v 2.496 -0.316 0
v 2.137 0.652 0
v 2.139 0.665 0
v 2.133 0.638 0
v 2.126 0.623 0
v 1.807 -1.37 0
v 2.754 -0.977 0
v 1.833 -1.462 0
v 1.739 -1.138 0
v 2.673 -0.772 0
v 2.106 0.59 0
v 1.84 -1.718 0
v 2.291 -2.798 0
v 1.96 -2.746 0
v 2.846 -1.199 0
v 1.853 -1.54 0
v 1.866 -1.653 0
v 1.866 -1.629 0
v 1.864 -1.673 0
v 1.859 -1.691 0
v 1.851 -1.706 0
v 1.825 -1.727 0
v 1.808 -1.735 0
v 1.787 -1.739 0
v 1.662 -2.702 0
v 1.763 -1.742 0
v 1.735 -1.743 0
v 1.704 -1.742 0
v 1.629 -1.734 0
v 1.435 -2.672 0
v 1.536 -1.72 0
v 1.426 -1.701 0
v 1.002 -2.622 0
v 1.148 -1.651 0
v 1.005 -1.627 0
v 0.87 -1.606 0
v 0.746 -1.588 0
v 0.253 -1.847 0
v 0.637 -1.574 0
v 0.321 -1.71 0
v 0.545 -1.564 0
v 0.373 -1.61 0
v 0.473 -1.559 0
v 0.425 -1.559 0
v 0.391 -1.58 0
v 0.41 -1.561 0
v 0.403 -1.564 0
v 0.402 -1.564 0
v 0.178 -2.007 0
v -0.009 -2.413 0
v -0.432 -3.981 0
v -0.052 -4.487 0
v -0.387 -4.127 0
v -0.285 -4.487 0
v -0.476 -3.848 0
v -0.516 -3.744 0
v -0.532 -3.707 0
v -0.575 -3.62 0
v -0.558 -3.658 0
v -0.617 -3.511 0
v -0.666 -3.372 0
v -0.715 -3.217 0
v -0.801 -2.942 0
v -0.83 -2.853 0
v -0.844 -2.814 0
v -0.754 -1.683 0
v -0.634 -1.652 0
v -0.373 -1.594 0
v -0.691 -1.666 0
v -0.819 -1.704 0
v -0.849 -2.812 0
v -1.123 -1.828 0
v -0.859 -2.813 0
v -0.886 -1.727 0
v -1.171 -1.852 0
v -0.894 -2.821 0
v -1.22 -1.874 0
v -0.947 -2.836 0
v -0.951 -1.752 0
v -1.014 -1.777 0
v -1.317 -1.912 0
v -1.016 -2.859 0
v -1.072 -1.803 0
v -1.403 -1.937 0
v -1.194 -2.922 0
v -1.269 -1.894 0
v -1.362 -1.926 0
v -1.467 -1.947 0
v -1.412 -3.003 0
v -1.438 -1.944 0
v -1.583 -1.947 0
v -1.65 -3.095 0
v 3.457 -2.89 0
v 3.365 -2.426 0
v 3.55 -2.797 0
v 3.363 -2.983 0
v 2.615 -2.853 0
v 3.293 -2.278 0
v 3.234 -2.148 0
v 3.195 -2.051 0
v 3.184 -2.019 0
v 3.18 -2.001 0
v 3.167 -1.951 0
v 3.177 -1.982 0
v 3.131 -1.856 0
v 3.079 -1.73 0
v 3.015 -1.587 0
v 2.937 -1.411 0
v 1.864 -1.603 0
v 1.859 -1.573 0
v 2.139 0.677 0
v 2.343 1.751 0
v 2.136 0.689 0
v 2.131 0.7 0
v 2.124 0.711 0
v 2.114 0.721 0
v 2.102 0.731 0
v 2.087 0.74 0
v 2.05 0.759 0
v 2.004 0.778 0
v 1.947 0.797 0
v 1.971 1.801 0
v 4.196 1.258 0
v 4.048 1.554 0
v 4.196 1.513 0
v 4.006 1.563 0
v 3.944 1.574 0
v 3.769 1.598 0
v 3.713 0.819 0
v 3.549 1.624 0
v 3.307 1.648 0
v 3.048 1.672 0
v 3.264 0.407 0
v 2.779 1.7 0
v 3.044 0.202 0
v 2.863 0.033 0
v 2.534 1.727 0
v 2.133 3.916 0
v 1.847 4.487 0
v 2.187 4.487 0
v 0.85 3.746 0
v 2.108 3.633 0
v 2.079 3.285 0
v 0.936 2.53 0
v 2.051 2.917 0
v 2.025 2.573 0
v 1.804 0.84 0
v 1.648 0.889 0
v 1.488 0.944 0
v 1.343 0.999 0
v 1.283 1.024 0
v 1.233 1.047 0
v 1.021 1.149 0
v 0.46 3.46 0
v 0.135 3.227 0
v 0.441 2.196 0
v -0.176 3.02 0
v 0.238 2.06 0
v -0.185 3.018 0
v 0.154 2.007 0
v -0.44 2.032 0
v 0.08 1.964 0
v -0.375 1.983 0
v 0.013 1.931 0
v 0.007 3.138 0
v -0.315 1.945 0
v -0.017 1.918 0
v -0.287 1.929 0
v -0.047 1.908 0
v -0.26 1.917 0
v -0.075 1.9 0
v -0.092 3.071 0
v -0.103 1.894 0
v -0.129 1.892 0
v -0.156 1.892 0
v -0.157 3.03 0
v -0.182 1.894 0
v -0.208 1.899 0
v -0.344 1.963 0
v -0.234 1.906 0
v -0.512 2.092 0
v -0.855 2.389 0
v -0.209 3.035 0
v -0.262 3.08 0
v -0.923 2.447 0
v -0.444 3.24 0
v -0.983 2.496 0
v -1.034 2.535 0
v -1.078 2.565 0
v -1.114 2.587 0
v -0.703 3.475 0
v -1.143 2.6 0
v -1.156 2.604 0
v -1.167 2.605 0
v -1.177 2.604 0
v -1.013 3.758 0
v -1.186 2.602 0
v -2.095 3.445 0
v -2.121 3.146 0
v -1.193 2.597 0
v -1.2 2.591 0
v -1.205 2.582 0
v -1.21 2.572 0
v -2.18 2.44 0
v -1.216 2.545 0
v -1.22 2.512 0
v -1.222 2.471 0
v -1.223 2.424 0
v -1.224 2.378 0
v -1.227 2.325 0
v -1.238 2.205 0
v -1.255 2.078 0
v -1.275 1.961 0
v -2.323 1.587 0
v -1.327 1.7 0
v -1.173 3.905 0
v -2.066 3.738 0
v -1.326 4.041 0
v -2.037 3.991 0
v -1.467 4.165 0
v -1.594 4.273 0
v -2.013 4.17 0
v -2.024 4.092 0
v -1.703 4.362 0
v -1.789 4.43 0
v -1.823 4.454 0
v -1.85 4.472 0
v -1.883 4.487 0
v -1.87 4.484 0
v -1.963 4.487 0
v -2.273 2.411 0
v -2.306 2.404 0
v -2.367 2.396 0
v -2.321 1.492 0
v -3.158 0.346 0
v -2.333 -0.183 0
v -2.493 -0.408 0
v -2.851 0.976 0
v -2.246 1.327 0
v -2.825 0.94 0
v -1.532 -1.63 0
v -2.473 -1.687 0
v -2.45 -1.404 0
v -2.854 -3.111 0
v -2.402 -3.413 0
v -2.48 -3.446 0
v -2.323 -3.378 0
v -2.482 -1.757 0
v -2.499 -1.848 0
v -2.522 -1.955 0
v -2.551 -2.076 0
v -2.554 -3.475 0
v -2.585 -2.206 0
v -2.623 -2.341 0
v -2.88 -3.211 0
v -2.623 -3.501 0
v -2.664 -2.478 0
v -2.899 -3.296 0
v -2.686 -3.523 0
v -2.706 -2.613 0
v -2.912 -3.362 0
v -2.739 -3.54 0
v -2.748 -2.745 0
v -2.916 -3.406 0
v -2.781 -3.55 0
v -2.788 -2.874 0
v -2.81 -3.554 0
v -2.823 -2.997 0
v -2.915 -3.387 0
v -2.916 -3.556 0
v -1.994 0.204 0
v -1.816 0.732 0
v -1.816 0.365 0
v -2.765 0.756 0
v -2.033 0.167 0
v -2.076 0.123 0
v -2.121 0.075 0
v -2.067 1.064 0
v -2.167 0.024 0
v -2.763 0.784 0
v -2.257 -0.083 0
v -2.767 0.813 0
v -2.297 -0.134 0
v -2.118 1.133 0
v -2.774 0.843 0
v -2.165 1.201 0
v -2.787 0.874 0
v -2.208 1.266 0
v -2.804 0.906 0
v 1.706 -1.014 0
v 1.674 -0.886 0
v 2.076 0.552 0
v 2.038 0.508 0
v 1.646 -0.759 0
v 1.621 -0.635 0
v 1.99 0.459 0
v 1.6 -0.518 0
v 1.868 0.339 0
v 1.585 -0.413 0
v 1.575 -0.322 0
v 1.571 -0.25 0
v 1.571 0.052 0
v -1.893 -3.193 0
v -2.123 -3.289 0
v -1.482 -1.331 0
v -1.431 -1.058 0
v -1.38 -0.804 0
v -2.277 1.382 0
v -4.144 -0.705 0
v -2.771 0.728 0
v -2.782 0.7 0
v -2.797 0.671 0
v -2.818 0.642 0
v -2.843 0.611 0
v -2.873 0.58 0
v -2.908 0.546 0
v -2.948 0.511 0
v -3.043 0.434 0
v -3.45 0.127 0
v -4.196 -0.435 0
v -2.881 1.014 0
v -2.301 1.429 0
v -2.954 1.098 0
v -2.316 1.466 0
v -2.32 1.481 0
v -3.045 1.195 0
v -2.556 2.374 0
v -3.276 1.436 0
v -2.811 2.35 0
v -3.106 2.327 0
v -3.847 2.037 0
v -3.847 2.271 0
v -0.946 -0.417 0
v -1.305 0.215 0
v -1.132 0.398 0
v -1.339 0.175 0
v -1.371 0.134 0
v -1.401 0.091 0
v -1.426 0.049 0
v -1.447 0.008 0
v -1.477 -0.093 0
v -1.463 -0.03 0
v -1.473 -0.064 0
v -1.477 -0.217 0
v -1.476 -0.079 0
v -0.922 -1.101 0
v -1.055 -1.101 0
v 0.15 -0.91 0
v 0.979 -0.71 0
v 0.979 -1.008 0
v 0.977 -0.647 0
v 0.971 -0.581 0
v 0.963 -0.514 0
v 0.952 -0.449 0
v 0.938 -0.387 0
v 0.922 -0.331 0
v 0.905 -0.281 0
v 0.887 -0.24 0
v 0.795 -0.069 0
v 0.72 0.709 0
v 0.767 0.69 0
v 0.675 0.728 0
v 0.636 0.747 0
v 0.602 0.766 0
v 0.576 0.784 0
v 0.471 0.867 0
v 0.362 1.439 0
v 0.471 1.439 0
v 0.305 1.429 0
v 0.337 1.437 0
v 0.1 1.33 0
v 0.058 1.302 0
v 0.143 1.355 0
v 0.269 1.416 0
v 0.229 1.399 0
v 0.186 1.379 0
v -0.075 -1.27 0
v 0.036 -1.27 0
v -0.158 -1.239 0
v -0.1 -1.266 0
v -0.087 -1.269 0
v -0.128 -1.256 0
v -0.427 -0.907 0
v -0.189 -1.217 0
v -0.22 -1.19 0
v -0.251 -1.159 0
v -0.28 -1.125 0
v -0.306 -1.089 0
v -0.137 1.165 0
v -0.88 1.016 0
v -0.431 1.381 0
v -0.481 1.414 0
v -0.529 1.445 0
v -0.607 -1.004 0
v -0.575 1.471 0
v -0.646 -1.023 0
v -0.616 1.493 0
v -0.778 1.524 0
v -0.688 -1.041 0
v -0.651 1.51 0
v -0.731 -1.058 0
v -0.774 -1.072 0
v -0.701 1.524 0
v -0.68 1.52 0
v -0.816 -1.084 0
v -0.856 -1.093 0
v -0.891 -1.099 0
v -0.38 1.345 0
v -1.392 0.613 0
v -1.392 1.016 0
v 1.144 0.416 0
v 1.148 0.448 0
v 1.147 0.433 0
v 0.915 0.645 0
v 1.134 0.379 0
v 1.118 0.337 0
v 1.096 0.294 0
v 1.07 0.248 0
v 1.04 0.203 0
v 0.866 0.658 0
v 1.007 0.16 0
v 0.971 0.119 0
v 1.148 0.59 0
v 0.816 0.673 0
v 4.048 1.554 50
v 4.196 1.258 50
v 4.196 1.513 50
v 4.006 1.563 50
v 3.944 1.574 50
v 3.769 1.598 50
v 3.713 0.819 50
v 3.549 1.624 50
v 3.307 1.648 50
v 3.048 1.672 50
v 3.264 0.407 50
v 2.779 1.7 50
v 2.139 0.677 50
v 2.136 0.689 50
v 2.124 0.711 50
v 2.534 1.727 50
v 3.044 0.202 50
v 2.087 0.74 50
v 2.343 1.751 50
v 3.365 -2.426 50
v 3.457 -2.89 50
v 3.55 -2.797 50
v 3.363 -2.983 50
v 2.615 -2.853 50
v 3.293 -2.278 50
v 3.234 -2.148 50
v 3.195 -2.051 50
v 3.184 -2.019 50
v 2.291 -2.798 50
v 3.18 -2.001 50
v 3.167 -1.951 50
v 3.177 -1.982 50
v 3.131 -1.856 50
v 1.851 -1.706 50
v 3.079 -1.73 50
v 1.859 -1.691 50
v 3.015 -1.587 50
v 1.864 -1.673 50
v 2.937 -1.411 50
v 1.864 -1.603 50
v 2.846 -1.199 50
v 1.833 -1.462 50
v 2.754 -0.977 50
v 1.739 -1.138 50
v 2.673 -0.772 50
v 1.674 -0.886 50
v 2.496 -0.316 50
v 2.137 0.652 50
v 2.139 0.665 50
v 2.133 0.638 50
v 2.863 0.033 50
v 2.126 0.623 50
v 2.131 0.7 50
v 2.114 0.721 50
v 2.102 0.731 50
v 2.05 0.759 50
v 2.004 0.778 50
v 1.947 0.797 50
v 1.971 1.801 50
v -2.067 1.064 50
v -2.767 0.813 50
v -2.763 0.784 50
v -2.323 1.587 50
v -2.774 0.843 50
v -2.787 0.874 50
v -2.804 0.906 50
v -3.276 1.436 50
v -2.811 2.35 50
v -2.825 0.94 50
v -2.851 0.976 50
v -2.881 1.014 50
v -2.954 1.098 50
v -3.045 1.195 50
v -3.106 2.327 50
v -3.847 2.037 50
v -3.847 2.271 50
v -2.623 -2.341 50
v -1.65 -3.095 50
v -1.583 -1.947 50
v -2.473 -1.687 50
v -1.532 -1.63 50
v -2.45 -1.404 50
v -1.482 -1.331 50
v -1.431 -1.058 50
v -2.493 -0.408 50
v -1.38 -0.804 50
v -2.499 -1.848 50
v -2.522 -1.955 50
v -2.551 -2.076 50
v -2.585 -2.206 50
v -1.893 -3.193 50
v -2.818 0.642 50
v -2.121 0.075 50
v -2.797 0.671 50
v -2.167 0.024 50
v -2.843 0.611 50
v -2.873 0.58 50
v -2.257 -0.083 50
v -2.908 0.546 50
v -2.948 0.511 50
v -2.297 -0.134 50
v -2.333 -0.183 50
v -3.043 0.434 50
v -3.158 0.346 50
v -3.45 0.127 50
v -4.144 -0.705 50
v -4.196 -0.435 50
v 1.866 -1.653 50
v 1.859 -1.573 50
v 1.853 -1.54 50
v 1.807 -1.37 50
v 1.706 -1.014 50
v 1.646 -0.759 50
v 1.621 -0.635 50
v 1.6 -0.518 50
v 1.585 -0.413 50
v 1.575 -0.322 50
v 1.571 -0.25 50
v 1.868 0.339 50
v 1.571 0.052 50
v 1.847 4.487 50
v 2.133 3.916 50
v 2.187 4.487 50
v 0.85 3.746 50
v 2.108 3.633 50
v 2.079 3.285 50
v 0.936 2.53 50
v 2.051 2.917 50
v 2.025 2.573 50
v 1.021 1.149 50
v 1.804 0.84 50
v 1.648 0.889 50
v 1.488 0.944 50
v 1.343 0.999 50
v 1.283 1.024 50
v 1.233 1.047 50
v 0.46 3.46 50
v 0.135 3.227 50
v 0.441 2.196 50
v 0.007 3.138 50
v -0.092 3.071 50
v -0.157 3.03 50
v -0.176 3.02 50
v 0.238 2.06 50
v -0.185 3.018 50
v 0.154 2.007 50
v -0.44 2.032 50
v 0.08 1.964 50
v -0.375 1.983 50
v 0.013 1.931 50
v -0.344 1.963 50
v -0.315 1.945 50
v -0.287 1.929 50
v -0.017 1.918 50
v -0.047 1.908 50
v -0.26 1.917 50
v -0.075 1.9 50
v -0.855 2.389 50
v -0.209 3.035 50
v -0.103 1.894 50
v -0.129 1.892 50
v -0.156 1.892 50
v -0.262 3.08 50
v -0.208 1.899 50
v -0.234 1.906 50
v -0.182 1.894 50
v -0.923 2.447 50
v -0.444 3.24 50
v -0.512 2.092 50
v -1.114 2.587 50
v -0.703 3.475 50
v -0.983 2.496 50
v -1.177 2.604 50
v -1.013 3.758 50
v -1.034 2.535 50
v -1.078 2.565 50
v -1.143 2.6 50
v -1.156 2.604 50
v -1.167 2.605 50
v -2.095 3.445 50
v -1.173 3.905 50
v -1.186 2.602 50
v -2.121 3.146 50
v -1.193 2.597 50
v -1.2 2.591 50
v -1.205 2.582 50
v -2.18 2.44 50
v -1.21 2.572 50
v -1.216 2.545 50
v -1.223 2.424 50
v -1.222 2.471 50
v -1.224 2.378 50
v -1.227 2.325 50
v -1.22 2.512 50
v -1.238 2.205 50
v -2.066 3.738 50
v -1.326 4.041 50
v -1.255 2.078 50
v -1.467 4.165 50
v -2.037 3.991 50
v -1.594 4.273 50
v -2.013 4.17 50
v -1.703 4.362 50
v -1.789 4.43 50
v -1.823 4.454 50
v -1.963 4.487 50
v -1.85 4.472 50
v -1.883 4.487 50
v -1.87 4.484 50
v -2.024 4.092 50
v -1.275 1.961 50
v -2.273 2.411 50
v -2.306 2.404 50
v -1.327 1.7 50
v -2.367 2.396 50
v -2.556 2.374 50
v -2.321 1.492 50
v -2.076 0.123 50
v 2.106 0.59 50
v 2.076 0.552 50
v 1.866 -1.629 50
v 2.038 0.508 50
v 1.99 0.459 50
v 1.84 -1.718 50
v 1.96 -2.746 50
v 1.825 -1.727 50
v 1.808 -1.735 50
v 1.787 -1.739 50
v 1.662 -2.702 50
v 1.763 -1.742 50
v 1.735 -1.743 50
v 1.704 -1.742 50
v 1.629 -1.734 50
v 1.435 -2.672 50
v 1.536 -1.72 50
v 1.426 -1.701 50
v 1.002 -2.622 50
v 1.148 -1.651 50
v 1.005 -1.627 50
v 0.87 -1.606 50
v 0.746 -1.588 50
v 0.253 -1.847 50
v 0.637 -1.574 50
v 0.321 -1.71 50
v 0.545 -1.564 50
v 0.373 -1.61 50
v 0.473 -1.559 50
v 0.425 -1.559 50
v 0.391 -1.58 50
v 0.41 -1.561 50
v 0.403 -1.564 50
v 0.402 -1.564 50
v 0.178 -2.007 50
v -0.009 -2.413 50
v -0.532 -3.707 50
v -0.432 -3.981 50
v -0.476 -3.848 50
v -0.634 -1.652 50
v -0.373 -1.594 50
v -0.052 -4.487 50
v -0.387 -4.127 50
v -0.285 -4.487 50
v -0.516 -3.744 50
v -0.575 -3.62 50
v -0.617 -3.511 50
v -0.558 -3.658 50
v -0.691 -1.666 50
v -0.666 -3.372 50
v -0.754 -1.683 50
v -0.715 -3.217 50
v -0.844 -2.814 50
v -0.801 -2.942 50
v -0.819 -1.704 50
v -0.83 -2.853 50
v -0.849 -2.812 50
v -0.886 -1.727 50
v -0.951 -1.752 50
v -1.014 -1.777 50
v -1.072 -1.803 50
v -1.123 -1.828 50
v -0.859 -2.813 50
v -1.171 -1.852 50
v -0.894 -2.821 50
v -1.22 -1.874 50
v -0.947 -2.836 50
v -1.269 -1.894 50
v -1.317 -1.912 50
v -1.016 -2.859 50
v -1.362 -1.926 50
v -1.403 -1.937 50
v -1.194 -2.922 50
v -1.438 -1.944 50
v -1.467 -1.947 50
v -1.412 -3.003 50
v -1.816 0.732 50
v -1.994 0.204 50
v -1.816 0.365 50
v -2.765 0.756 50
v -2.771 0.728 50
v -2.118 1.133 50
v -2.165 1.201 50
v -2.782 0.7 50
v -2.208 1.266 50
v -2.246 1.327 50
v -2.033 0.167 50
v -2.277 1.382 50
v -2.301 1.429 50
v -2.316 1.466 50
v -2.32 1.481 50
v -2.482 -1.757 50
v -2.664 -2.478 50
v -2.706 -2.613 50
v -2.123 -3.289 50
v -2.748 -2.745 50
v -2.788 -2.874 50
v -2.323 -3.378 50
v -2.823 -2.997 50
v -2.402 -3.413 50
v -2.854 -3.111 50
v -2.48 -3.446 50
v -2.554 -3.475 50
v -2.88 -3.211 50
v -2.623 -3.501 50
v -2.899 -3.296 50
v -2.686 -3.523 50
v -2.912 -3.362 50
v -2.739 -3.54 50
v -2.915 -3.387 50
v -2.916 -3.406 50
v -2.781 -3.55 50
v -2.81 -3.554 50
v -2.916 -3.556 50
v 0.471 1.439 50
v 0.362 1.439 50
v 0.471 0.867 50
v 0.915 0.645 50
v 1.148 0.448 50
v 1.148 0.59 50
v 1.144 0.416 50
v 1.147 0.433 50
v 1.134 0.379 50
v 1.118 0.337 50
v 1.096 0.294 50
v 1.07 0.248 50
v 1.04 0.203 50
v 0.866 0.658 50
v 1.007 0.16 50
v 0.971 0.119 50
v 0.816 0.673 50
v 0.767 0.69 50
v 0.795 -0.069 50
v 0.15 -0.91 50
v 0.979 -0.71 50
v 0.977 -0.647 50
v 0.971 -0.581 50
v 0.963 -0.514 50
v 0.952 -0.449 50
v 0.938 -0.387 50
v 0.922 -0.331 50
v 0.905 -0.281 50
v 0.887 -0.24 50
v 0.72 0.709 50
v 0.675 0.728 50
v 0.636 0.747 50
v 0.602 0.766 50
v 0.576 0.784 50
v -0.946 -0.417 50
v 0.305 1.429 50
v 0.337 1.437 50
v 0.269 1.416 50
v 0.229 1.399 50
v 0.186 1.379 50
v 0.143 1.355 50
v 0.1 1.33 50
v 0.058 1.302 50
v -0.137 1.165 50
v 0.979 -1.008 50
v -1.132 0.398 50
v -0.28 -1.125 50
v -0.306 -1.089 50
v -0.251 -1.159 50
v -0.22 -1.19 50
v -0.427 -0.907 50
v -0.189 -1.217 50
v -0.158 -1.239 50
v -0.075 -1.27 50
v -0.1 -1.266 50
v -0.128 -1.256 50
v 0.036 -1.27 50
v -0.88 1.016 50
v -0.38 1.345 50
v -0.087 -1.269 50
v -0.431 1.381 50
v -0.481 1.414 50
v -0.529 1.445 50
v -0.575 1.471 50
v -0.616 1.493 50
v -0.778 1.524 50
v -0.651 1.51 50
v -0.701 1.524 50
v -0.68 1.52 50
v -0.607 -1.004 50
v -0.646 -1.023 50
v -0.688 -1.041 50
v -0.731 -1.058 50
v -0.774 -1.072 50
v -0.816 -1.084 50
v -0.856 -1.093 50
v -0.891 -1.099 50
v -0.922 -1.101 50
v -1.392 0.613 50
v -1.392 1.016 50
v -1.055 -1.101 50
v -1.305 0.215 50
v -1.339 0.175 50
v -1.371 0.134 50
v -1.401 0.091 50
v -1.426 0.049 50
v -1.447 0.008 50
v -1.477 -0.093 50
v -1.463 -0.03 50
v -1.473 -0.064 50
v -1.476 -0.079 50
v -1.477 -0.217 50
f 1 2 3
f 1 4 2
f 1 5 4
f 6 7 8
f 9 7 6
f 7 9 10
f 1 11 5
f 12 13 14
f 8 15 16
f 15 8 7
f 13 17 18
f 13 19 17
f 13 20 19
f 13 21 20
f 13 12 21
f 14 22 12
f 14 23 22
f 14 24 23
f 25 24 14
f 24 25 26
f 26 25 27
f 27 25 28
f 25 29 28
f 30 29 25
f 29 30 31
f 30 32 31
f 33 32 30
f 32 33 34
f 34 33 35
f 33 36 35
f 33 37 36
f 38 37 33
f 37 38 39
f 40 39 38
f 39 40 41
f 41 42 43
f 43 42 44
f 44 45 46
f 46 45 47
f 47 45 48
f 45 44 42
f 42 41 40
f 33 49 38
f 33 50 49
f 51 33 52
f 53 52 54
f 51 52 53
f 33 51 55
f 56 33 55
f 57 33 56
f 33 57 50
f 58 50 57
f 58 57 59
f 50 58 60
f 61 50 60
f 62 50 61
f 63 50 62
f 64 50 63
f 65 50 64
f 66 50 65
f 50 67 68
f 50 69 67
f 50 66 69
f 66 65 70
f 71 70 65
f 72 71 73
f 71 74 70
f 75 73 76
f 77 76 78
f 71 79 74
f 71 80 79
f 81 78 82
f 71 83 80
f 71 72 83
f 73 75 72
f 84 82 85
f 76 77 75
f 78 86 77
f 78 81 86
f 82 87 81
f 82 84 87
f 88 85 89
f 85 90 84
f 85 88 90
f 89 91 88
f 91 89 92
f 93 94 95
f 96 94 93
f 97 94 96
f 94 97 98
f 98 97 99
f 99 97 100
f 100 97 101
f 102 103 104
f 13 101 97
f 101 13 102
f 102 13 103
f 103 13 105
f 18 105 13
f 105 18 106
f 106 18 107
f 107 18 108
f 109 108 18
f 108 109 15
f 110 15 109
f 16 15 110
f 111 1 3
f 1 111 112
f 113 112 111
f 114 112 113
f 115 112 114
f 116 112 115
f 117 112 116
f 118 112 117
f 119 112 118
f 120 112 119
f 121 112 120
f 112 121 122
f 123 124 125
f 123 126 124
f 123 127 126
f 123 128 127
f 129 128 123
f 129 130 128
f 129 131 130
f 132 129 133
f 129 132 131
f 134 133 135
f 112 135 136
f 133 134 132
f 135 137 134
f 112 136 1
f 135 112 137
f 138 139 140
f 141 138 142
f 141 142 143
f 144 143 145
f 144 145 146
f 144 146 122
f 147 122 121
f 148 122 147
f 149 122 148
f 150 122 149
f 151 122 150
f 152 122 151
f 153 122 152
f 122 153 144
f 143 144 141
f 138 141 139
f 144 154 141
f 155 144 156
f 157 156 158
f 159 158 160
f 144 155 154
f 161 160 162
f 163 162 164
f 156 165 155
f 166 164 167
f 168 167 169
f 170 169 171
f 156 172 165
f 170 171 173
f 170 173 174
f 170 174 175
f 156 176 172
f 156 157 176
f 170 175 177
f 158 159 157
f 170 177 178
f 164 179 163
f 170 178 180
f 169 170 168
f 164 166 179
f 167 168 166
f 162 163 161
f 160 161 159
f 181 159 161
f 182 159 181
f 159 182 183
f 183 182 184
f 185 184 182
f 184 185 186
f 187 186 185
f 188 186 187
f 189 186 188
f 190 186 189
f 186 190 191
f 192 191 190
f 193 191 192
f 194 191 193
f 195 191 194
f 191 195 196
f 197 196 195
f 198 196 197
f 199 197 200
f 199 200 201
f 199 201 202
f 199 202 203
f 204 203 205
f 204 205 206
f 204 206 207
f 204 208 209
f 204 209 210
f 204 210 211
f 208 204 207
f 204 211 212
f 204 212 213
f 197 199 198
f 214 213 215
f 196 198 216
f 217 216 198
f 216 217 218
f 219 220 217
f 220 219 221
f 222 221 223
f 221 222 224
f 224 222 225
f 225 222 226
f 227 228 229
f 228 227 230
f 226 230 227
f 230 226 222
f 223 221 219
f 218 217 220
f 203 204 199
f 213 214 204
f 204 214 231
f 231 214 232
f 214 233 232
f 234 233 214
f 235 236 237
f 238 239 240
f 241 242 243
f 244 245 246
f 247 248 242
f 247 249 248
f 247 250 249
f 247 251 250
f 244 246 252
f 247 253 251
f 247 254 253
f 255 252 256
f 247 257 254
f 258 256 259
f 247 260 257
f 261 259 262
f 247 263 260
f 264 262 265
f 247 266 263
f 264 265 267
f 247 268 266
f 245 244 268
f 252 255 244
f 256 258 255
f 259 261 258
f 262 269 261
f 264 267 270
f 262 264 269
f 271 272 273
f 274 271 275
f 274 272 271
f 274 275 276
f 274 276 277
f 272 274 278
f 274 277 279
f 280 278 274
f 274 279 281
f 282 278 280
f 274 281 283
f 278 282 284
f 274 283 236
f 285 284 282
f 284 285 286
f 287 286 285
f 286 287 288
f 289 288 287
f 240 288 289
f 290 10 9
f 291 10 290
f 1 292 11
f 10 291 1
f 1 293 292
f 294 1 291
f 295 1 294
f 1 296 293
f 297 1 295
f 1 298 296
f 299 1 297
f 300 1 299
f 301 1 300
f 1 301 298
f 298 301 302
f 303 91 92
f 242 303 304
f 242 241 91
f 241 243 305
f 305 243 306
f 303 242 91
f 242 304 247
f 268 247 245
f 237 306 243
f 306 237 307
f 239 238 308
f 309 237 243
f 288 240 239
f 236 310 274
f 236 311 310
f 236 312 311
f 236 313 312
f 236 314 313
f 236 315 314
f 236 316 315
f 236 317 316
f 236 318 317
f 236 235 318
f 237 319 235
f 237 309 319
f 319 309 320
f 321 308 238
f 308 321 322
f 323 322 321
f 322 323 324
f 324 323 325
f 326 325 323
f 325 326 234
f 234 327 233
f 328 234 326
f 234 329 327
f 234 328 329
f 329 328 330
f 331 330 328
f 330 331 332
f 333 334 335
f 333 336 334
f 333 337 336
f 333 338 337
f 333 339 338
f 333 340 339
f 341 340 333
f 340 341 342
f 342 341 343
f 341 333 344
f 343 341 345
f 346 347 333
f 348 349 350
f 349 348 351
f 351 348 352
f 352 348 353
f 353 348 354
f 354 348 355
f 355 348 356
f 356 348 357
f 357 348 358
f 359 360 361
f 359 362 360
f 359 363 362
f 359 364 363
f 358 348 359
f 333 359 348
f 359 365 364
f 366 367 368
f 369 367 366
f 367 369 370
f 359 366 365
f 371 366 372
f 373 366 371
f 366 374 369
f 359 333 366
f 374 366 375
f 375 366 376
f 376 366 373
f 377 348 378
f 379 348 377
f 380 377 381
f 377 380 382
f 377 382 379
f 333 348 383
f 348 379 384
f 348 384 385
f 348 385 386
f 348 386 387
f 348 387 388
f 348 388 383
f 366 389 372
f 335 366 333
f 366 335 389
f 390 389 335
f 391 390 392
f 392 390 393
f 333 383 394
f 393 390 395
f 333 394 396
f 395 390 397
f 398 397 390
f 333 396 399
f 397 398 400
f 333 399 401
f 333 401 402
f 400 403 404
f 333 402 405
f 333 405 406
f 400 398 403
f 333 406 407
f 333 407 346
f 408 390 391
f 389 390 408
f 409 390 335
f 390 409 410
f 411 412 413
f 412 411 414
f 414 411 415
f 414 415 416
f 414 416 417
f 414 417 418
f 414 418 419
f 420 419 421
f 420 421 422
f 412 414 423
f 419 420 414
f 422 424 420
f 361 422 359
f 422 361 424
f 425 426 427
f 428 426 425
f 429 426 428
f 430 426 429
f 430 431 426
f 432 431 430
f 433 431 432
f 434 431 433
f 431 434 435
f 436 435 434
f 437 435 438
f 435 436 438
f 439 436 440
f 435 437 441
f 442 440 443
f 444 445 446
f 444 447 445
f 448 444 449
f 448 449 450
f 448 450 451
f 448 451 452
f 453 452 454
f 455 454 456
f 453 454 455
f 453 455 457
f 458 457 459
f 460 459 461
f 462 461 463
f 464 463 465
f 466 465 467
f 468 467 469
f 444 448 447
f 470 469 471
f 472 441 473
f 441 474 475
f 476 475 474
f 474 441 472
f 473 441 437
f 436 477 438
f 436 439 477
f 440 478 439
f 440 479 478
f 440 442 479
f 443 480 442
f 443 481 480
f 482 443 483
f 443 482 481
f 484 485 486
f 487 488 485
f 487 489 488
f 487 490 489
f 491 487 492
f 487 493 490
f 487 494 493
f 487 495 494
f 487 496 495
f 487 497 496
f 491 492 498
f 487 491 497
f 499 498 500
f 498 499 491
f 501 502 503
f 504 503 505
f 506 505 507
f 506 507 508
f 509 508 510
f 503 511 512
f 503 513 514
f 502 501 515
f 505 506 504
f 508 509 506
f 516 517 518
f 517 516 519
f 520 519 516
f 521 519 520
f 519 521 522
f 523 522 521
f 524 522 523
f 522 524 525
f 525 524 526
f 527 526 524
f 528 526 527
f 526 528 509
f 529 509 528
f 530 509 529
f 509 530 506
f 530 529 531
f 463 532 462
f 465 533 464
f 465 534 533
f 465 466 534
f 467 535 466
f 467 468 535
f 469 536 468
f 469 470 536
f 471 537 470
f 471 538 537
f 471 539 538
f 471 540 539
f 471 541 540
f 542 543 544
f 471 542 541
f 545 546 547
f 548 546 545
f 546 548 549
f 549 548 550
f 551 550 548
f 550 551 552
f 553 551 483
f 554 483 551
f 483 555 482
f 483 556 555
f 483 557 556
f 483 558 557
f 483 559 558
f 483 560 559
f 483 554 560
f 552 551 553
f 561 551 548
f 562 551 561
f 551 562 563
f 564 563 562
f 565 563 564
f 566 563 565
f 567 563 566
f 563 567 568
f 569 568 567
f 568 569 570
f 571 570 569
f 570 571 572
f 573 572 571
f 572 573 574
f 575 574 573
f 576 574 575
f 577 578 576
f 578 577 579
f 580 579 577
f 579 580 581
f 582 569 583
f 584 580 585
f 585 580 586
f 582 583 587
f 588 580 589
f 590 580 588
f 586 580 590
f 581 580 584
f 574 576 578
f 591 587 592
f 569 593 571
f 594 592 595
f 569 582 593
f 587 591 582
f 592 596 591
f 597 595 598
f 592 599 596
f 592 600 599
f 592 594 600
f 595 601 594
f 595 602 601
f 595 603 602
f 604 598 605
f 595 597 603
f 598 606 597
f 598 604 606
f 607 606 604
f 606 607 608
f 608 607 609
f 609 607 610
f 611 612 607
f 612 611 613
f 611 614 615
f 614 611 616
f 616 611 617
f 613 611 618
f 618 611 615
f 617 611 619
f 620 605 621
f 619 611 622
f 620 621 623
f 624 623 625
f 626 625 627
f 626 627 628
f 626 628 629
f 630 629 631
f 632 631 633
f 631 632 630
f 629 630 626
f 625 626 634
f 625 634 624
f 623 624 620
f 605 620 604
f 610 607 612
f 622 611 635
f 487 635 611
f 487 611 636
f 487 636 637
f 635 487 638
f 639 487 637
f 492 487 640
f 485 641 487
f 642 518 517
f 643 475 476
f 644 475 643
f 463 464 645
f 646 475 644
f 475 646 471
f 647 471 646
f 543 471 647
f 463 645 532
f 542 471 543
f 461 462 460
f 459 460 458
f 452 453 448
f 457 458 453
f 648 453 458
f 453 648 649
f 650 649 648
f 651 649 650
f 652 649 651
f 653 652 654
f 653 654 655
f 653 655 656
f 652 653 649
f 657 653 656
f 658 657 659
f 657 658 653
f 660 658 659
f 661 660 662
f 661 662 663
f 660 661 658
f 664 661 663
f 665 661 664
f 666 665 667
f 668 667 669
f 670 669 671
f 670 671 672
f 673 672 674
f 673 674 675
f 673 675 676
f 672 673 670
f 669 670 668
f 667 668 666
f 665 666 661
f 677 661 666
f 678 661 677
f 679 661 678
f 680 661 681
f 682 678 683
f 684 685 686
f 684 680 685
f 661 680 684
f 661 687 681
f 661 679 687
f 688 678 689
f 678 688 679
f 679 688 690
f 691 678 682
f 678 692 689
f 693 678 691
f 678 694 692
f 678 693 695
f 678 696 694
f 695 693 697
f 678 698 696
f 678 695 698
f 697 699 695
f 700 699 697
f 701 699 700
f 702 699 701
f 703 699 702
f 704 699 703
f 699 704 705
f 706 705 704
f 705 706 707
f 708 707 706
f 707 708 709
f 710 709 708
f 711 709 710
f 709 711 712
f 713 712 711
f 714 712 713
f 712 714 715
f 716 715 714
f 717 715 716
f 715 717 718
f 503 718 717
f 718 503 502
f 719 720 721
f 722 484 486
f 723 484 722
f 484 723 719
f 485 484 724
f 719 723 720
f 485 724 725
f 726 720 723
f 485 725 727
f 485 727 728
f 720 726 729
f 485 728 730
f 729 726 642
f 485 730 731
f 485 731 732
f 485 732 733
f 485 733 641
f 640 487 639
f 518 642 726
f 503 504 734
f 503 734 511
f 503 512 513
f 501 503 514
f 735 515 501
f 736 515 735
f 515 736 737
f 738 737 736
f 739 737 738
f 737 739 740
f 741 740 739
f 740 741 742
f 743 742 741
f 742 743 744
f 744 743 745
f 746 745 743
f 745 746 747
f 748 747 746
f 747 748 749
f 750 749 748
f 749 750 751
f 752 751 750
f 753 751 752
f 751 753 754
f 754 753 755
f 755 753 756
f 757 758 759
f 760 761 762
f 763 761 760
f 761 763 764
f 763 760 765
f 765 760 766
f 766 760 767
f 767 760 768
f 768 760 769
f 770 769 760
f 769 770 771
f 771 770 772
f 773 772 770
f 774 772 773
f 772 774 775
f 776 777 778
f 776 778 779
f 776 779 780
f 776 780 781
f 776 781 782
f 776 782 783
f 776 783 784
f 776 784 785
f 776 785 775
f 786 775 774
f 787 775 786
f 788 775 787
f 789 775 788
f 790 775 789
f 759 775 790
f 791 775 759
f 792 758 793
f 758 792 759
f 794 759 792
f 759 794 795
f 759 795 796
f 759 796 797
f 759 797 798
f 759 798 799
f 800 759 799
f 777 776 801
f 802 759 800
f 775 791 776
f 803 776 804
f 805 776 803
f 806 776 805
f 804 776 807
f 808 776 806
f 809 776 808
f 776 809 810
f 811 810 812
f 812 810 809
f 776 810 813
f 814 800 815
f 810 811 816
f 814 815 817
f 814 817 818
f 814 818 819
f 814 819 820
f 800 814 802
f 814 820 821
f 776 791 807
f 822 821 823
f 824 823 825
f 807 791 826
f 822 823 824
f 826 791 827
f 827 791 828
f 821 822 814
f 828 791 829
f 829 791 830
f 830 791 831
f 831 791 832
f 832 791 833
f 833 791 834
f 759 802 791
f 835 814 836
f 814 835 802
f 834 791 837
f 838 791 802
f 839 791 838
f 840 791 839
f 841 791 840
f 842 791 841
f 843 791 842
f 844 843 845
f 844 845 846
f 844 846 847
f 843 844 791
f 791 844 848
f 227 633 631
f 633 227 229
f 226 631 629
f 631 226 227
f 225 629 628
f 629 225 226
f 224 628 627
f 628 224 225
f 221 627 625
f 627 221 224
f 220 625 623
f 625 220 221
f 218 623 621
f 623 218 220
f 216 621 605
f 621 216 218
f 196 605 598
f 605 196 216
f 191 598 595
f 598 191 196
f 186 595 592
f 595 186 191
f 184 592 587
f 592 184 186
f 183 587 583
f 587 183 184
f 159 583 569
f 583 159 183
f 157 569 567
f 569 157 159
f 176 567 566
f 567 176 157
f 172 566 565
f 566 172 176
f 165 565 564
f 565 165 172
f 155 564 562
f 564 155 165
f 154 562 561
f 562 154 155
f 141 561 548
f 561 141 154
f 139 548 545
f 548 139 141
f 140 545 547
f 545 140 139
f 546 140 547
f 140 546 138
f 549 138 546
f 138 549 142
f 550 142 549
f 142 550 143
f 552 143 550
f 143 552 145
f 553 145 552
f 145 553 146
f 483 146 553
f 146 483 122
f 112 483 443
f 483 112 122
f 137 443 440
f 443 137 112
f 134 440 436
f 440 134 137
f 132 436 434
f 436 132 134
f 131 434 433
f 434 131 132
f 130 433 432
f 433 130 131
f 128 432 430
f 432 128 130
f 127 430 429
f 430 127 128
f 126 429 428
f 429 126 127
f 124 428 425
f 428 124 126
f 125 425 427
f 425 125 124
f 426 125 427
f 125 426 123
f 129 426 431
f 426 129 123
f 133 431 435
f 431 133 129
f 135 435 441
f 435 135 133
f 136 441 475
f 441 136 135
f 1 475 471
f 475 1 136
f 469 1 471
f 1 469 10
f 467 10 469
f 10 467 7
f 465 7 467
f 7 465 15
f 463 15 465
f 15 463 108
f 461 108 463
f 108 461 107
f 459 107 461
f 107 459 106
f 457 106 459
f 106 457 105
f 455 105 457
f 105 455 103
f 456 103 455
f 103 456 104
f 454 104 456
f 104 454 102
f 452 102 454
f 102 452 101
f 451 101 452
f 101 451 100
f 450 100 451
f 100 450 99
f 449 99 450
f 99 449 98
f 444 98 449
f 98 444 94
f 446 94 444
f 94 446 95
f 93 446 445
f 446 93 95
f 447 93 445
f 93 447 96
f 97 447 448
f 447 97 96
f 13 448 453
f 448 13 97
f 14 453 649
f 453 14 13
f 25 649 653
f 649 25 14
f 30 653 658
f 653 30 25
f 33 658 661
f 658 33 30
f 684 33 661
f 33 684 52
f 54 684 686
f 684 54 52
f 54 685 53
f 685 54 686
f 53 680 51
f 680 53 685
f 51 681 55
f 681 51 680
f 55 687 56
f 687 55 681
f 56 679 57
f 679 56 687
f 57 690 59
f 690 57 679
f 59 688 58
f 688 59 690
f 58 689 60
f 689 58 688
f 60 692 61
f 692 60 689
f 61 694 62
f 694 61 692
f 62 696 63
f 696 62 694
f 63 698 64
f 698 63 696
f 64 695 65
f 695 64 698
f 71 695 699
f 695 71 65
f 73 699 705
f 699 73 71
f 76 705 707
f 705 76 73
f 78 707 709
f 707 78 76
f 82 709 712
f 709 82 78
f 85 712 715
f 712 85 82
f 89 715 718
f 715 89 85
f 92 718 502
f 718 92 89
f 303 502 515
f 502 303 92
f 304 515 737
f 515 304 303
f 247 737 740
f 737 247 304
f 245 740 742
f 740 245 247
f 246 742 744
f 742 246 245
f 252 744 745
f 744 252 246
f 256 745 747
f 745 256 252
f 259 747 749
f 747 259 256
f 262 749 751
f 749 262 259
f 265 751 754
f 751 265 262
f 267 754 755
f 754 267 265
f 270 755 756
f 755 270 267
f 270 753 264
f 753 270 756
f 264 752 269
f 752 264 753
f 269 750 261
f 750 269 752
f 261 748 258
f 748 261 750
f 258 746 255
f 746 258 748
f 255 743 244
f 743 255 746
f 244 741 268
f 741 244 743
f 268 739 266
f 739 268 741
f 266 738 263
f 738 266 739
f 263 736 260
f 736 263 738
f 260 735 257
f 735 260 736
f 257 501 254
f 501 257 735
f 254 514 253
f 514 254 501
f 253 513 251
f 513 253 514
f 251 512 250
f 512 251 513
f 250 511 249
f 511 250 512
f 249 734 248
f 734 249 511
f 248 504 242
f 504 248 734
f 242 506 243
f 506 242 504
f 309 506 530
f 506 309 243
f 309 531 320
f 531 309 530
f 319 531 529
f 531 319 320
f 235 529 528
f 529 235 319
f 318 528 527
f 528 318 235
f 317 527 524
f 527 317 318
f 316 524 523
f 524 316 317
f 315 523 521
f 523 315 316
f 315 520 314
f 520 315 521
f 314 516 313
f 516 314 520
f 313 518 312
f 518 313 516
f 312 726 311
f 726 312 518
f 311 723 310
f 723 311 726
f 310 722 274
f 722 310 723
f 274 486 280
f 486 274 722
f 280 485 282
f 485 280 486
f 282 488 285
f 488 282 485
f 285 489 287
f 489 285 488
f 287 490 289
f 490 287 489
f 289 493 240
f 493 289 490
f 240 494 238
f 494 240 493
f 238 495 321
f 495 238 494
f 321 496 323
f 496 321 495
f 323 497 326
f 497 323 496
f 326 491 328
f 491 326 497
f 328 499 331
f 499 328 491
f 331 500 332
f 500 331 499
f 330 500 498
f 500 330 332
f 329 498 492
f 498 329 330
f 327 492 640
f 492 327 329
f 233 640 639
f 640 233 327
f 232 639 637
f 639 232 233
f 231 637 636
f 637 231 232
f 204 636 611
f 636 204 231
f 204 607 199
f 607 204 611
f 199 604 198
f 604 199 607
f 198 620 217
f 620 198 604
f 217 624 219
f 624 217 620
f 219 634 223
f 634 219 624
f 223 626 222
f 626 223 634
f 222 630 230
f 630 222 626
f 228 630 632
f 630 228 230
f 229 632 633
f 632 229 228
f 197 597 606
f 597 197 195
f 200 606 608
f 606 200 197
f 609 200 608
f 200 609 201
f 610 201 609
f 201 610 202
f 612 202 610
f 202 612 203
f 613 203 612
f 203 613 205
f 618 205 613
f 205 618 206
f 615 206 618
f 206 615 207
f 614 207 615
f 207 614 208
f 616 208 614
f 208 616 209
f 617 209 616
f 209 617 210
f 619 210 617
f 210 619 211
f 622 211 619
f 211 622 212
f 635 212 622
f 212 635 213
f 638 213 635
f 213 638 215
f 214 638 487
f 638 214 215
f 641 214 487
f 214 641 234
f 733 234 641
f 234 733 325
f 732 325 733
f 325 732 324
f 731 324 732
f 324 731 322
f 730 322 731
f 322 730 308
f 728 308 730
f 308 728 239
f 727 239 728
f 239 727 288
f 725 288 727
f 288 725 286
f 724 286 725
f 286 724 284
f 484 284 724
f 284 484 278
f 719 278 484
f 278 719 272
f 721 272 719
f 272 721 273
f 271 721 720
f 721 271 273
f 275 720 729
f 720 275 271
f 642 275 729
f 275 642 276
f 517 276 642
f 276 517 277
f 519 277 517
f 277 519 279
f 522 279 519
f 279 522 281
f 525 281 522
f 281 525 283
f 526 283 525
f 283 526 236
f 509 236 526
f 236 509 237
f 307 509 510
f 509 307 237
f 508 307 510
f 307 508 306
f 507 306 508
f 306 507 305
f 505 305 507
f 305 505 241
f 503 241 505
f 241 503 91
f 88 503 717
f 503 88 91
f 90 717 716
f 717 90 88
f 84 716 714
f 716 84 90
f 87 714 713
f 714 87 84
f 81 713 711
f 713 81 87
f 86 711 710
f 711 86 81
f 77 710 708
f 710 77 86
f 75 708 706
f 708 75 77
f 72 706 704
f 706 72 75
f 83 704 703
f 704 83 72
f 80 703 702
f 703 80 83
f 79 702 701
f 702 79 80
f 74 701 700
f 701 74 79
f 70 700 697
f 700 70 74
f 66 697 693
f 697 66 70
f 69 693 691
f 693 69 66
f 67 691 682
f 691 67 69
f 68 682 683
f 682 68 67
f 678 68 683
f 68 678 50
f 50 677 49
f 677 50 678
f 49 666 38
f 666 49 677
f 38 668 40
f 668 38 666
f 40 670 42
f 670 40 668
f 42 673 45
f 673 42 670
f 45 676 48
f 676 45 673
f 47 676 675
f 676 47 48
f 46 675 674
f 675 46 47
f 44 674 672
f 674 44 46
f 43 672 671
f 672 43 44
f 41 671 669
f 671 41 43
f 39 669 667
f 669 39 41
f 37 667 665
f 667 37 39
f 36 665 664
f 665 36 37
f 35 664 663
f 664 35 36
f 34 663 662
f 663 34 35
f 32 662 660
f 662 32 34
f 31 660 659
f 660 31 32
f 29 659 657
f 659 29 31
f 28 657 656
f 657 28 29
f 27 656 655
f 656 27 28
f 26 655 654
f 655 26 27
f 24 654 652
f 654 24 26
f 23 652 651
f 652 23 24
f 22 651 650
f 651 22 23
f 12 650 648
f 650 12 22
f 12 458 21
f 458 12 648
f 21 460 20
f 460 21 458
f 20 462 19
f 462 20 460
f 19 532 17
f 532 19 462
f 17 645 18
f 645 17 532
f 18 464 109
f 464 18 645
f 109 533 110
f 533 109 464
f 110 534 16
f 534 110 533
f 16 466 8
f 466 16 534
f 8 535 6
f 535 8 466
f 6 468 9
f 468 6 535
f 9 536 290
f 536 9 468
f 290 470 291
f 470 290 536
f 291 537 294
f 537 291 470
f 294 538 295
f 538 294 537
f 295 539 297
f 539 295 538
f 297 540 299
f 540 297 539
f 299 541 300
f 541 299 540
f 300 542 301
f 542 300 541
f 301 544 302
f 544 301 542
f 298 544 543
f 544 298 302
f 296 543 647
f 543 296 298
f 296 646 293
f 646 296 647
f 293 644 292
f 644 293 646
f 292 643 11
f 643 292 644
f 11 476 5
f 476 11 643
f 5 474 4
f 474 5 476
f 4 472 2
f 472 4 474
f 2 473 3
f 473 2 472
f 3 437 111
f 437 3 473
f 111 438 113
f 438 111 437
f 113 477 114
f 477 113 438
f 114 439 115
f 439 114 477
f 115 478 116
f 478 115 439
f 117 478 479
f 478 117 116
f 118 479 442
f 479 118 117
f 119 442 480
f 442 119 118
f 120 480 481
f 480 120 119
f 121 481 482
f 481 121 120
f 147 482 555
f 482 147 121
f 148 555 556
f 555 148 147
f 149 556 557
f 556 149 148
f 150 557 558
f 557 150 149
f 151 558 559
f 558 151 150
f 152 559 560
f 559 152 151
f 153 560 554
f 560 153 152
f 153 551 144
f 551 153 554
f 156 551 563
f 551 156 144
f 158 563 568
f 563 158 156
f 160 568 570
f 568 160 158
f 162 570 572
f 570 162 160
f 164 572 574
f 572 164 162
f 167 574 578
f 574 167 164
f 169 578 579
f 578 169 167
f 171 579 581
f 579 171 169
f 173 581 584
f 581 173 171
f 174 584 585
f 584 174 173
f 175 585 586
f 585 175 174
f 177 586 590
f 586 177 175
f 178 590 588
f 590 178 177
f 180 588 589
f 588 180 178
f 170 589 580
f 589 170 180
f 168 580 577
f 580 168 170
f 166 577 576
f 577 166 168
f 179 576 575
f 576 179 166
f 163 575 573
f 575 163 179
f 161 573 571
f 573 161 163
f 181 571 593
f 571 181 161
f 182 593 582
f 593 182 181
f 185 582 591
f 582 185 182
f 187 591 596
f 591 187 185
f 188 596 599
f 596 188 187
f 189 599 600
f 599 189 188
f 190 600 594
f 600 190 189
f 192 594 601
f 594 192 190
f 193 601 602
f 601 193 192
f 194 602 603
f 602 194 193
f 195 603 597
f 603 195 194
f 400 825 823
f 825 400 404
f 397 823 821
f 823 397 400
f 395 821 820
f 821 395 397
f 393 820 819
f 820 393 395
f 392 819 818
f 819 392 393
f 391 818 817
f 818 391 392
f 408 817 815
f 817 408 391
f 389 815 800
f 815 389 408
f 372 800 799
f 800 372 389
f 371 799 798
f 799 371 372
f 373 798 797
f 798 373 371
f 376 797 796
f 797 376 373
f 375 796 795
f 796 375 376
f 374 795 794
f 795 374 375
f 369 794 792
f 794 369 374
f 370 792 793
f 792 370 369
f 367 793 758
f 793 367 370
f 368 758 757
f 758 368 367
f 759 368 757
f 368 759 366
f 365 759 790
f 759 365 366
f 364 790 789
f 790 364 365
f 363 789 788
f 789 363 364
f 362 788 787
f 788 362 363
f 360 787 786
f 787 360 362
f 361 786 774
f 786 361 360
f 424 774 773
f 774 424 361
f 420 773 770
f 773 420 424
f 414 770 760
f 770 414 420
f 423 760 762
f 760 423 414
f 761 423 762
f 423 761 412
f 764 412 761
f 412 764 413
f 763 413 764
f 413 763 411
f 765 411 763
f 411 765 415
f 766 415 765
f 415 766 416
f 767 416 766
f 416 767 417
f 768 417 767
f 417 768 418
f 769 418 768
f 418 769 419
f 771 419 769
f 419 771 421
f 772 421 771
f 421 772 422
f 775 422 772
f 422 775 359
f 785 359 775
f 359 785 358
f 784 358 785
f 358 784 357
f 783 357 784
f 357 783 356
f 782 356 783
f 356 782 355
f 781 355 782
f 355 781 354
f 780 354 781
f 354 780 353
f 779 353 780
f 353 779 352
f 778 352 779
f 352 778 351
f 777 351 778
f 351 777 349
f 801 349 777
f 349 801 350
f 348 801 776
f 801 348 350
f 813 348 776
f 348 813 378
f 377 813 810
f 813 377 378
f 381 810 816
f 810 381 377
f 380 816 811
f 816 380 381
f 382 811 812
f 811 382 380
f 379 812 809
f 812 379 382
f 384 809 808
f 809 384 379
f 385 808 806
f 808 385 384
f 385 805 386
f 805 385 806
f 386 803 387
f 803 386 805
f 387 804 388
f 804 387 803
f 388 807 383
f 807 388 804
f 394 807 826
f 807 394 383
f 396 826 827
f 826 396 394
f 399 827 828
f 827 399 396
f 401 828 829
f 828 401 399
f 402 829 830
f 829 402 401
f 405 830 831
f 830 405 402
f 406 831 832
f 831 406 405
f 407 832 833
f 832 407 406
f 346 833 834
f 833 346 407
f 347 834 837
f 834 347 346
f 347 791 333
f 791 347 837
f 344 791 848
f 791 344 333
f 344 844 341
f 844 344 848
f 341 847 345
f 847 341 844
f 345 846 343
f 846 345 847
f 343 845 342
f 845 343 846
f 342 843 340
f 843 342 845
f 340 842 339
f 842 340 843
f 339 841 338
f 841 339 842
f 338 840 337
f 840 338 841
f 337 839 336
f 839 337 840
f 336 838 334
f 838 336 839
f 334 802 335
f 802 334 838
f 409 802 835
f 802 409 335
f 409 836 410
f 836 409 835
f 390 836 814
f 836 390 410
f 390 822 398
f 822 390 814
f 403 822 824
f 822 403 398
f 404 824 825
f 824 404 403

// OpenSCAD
// Generated by inkscape None + inkscape-paths2openscad 0.27
// Sat Sep 26 10:11:57 2020 from "inkscape.svg"

// Module names are of the form poly_<inkscape-path-id>().  As a result,
// you can associate a polygon in this OpenSCAD program with the corresponding
// SVG element in the Inkscape document by looking for the XML element with
// the attribute id="inkscape-path-id".

// fudge value is used to ensure that subtracted solids are a tad taller
// in the z dimension than the polygon being subtracted from.  This helps
// keep the resulting .stl file manifold.
fudge = 0.1;
user_unit_scale_x = 1.0;
user_unit_scale_y = 1.0;
custom_scale_x = 1;
custom_scale_y = 1;
zsize = 50;
line_fn = 16;
min_line_width = 1.0;
line_width_scale = 1.0;
function min_line_mm(w) = max(min_line_width, w * line_width_scale) * 1;


path965_0_center = [0.000000,0.000000];
path965_0_points = [[-0.387345,4.127429],[-0.431608,3.981035],[-0.476054,3.848430],[-0.515518,3.744199],[-0.531767,3.707282],[-0.544835,3.682929],[-0.558154,3.658135],[-0.575146,3.619978],[-0.617350,3.511205],[-0.665854,3.371879],[-0.715065,3.217269],[-0.800735,2.941646],[-0.829908,2.852709],[-0.844315,2.813998],[-0.848805,2.812373],[-0.858682,2.813017],[-0.893522,2.820700],[-0.946678,2.836225],[-1.015992,2.858771],[-1.194474,2.921634],[-1.411716,3.002715],[-1.650467,3.095436],[-1.893475,3.193221],[-2.123488,3.289494],[-2.323255,3.377679],[-2.401950,3.412778],[-2.479542,3.445596],[-2.554033,3.475408],[-2.623428,3.501491],[-2.685728,3.523122],[-2.738937,3.539577],[-2.781058,3.550134],[-2.810095,3.554068],[-2.915925,3.556068],[-2.915925,3.405518],[-2.914837,3.386851],[-2.911643,3.362169],[-2.899372,3.296388],[-2.879972,3.211426],[-2.854302,3.110535],[-2.823225,2.996965],[-2.787599,2.873969],[-2.748286,2.744796],[-2.706145,2.612698],[-2.663534,2.477893],[-2.622871,2.340958],[-2.585112,2.205690],[-2.551213,2.075885],[-2.522127,1.955338],[-2.498810,1.847847],[-2.482218,1.757205],[-2.473305,1.687210],[-2.450305,1.404028],[-3.296975,1.054629],[-4.143645,0.705231],[-4.169845,0.570342],[-4.196045,0.435453],[-3.450165,-0.127150],[-3.157801,-0.346135],[-3.042665,-0.434255],[-2.947804,-0.511295],[-2.907878,-0.546401],[-2.872902,-0.579626],[-2.842837,-0.611269],[-2.817643,-0.641625],[-2.797280,-0.670992],[-2.781710,-0.699665],[-2.770891,-0.727943],[-2.764786,-0.756121],[-2.763354,-0.784497],[-2.766556,-0.813367],[-2.774352,-0.843028],[-2.786703,-0.873777],[-2.803569,-0.905910],[-2.824911,-0.939725],[-2.850689,-0.975519],[-2.880863,-1.013587],[-2.954243,-1.097736],[-3.044734,-1.194546],[-3.275785,-1.435648],[-3.847285,-2.036846],[-3.847285,-2.153807],[-3.847285,-2.270767],[-3.106455,-2.326537],[-2.811462,-2.350472],[-2.555912,-2.374421],[-2.367170,-2.395603],[-2.306401,-2.404287],[-2.272595,-2.411237],[-2.179595,-2.440167],[-2.121395,-3.146237],[-2.094855,-3.445444],[-2.065596,-3.738166],[-2.037165,-3.990816],[-2.024367,-4.091618],[-2.013105,-4.169809],[-1.963005,-4.487308],[-1.882705,-4.487308],[-1.870424,-4.483527],[-1.850453,-4.472433],[-1.823237,-4.454400],[-1.789222,-4.429800],[-1.702579,-4.362399],[-1.594090,-4.273219],[-1.467319,-4.165249],[-1.325833,-4.041479],[-1.173196,-3.904898],[-1.012975,-3.758494],[-0.703430,-3.474561],[-0.444199,-3.240239],[-0.262441,-3.079836],[-0.209102,-3.034950],[-0.185315,-3.017660],[-0.176253,-3.020281],[-0.157296,-3.030370],[-0.091819,-3.071455],[0.006869,-3.137926],[0.134521,-3.226796],[0.459736,-3.459773],[0.849855,-3.746474],[1.846825,-4.487308],[2.017025,-4.487308],[2.187215,-4.487308],[2.133315,-3.915808],[2.108087,-3.633007],[2.079313,-3.285473],[2.050535,-2.917285],[2.025295,-2.572519],[1.971195,-1.800729],[2.342785,-1.750549],[2.533834,-1.726908],[2.779319,-1.699637],[3.047602,-1.672109],[3.307045,-1.647699],[3.548859,-1.623994],[3.769140,-1.598390],[3.943581,-1.573965],[4.006016,-1.563157],[4.047875,-1.553798],[4.196045,-1.512569],[4.196045,-1.385039],[4.196045,-1.257509],[3.713065,-0.819244],[3.264164,-0.407366],[3.043722,-0.202415],[2.863135,-0.032541],[2.496205,0.315899],[2.672745,0.771792],[2.754344,0.977128],[2.846011,1.199198],[2.936525,1.411266],[3.014665,1.586597],[3.078896,1.730307],[3.131480,1.856278],[3.167001,1.950924],[3.176671,1.982254],[3.180045,2.000658],[3.183819,2.019295],[3.194635,2.051296],[3.234367,2.148408],[3.293183,2.278030],[3.365025,2.426198],[3.550015,2.796588],[3.456515,2.889989],[3.363115,2.983389],[2.615405,2.853069],[2.290935,2.798477],[1.960196,2.746203],[1.661927,2.702172],[1.434865,2.672308],[1.002035,2.621909],[0.475265,3.554609],[-0.051515,4.487308],[-0.168005,4.487308],[-0.284505,4.487308],[-0.387345,4.127429],[0.402595,1.563862],[0.410083,1.560696],[0.424569,1.558886],[0.473002,1.559155],[0.544838,1.564313],[0.637020,1.574003],[0.746491,1.587866],[0.870196,1.605547],[1.005076,1.626688],[1.148075,1.650931],[1.426446,1.701111],[1.536465,1.720252],[1.628529,1.734135],[1.703755,1.741789],[1.735402,1.742978],[1.763258,1.742246],[1.787463,1.739472],[1.808156,1.734535],[1.825477,1.727315],[1.839565,1.717688],[1.850560,1.705536],[1.858602,1.690735],[1.863830,1.673166],[1.866383,1.652707],[1.866402,1.629236],[1.864026,1.602633],[1.859394,1.572776],[1.852646,1.539545],[1.833360,1.462472],[1.807285,1.370446],[1.739235,1.137654],[1.705523,1.013622],[1.674072,0.886028],[1.645571,0.758515],[1.620707,0.634725],[1.600171,0.518301],[1.584649,0.412884],[1.574831,0.322117],[1.571405,0.249642],[1.571405,-0.051518],[1.867745,-0.338735],[1.989999,-0.458910],[2.037736,-0.508422],[2.076432,-0.551788],[2.106000,-0.589687],[2.126355,-0.622799],[2.133051,-0.637771],[2.137411,-0.651800],[2.139425,-0.664972],[2.139081,-0.677371],[2.136370,-0.689082],[2.131280,-0.700190],[2.123801,-0.710780],[2.113921,-0.720936],[2.101631,-0.730743],[2.086919,-0.740287],[2.050188,-0.758922],[2.003640,-0.777520],[1.947192,-0.796759],[1.804245,-0.839877],[1.647825,-0.888658],[1.487932,-0.943925],[1.343321,-0.998889],[1.282607,-1.024137],[1.232745,-1.046762],[1.021075,-1.148737],[0.978775,-1.839217],[0.936475,-2.529697],[0.441105,-2.196216],[0.237766,-2.060480],[0.153930,-2.007322],[0.079693,-1.964066],[0.013339,-1.930785],[-0.017418,-1.917908],[-0.046848,-1.907552],[-0.075167,-1.899726],[-0.102587,-1.894439],[-0.129325,-1.891700],[-0.155594,-1.891518],[-0.181609,-1.893902],[-0.207585,-1.898861],[-0.233736,-1.906404],[-0.260277,-1.916540],[-0.287423,-1.929279],[-0.315388,-1.944629],[-0.344387,-1.962599],[-0.374634,-1.983199],[-0.439732,-2.032322],[-0.512398,-2.092071],[-0.687305,-2.243736],[-0.854690,-2.388884],[-0.923444,-2.446913],[-0.983094,-2.495534],[-1.034283,-2.534961],[-1.077653,-2.565412],[-1.113845,-2.587101],[-1.143503,-2.600244],[-1.156081,-2.603679],[-1.167266,-2.605058],[-1.177139,-2.604409],[-1.185779,-2.601758],[-1.193266,-2.597133],[-1.199682,-2.590560],[-1.205105,-2.582067],[-1.209617,-2.571680],[-1.216227,-2.545334],[-1.220154,-2.511736],[-1.222039,-2.471104],[-1.222525,-2.423653],[-1.223591,-2.377923],[-1.226647,-2.324942],[-1.237875,-2.204820],[-1.254503,-2.078468],[-1.274825,-1.961063],[-1.327125,-1.699556],[-1.825155,-1.643206],[-2.323185,-1.586856],[-2.321185,-1.491957],[-2.319688,-1.480565],[-2.315660,-1.466107],[-2.300538,-1.428868],[-2.276871,-1.381995],[-2.245710,-1.327240],[-2.208109,-1.266358],[-2.165119,-1.201100],[-2.117794,-1.133222],[-2.067185,-1.064476],[-1.815535,-0.731893],[-1.815535,-0.548431],[-1.815535,-0.364970],[-1.994005,-0.203681],[-2.033143,-0.166687],[-2.075981,-0.123293],[-2.121130,-0.075084],[-2.167203,-0.023644],[-2.256560,0.082585],[-2.297069,0.134206],[-2.332945,0.182718],[-2.493405,0.407828],[-1.936905,0.606051],[-1.380405,0.804275],[-1.430905,1.058275],[-1.481529,1.330928],[-1.532295,1.629775],[-1.583195,1.947275],[-1.466535,1.946750],[-1.438454,1.944226],[-1.403302,1.937196],[-1.362486,1.926148],[-1.317415,1.911570],[-1.269498,1.893951],[-1.220143,1.873779],[-1.170759,1.851543],[-1.122755,1.827730],[-1.071793,1.802755],[-1.013940,1.777191],[-0.951200,1.751759],[-0.885575,1.727181],[-0.819069,1.704177],[-0.753685,1.683470],[-0.691426,1.665782],[-0.634295,1.651834],[-0.372965,1.594434],[-0.191215,2.003685],[-0.009465,2.412939],[0.177705,2.007111],[0.253335,1.846583],[0.320890,1.709504],[0.373002,1.610417],[0.390965,1.579665],[0.402305,1.563866],[0.402595,1.563862],[-0.306355,1.088572],[-0.426775,0.907211],[-0.607455,1.003901],[-0.646483,1.023324],[-0.688159,1.041444],[-0.731195,1.057864],[-0.774303,1.072188],[-0.816194,1.084019],[-0.855582,1.092961],[-0.891178,1.098617],[-0.921695,1.100590],[-1.055255,1.100590],[-1.000655,0.758840],[-0.946055,0.417089],[-1.211365,0.316944],[-1.476685,0.216799],[-1.476685,0.092652],[-1.475792,0.079055],[-1.473170,0.063974],[-1.463097,0.029989],[-1.447172,-0.008041],[-1.426103,-0.048856],[-1.400596,-0.091195],[-1.371360,-0.133796],[-1.339100,-0.175400],[-1.304525,-0.214744],[-1.132375,-0.397993],[-1.262195,-0.505736],[-1.392015,-0.613477],[-1.392015,-0.814777],[-1.392015,-1.016076],[-1.135895,-1.016076],[-0.879785,-1.016076],[-0.828985,-1.270076],[-0.778185,-1.524076],[-0.700685,-1.524076],[-0.680167,-1.520411],[-0.651440,-1.509909],[-0.615820,-1.493305],[-0.574620,-1.471336],[-0.529157,-1.444738],[-0.480745,-1.414247],[-0.430699,-1.380599],[-0.380335,-1.344532],[-0.137485,-1.164987],[0.058415,-1.302198],[0.099973,-1.329761],[0.143011,-1.355476],[0.186282,-1.378778],[0.228539,-1.399105],[0.268533,-1.415894],[0.305019,-1.428583],[0.336749,-1.436609],[0.362475,-1.439410],[0.470635,-1.439410],[0.470635,-1.153443],[0.470635,-0.867477],[0.576465,-0.784117],[0.602475,-0.766235],[0.635927,-0.747360],[0.675433,-0.728059],[0.719602,-0.708904],[0.767047,-0.690465],[0.816377,-0.673310],[0.866203,-0.658011],[0.915135,-0.645137],[1.147965,-0.589517],[1.147965,-0.448419],[1.147048,-0.433072],[1.144359,-0.416241],[1.134026,-0.378804],[1.117691,-0.337459],[1.096079,-0.293555],[1.069916,-0.248443],[1.039927,-0.203473],[1.006838,-0.159993],[0.971375,-0.119355],[0.794795,0.068614],[0.886695,0.240369],[0.905143,0.280953],[0.922359,0.330568],[0.937965,0.387287],[0.951583,0.449185],[0.962833,0.514334],[0.971337,0.580810],[0.976717,0.646686],[0.978595,0.710036],[0.978595,1.007947],[0.564365,0.958887],[0.150135,0.909827],[0.093035,1.089876],[0.035935,1.269924],[-0.075025,1.269924],[-0.086948,1.268983],[-0.099765,1.266222],[-0.127600,1.255613],[-0.157582,1.238841],[-0.188759,1.216650],[-0.220181,1.189782],[-0.250898,1.158983],[-0.279959,1.124995],[-0.306415,1.088563],[-0.306355,1.088572]];
path965_0_paths = [[0,1,2,3,4,5,6,7,8,9,10,11,12,13,14,15,16,17,18,19,20,21,22,23,24,25,26,27,28,29,30,31,32,33,34,35,36,37,38,39,40,41,42,43,44,45,46,47,48,49,50,51,52,53,54,55,56,57,58,59,60,61,62,63,64,65,66,67,68,69,70,71,72,73,74,75,76,77,78,79,80,81,82,83,84,85,86,87,88,89,90,91,92,93,94,95,96,97,98,99,100,101,102,103,104,105,106,107,108,109,110,111,112,113,114,115,116,117,118,119,120,121,122,123,124,125,126,127,128,129,130,131,132,133,134,135,136,137,138,139,140,141,142,143,144,145,146,147,148,149,150,151,152,153,154,155,156,157,158,159,160,161,162,163,164,165,166,167,168,169,170,171,172,173,174,175],
				[176,177,178,179,180,181,182,183,184,185,186,187,188,189,190,191,192,193,194,195,196,197,198,199,200,201,202,203,204,205,206,207,208,209,210,211,212,213,214,215,216,217,218,219,220,221,222,223,224,225,226,227,228,229,230,231,232,233,234,235,236,237,238,239,240,241,242,243,244,245,246,247,248,249,250,251,252,253,254,255,256,257,258,259,260,261,262,263,264,265,266,267,268,269,270,271,272,273,274,275,276,277,278,279,280,281,282,283,284,285,286,287,288,289,290,291,292,293,294,295,296,297,298,299,300,301,302,303,304,305,306,307,308,309,310,311,312,313,314,315,316,317,318,319,320,321,322,323,324,325,326,327,328,329,330,331,332,333,334,335,336,337,338,339,340,341,342,343,344,345,346,347],
				[348,349,350,351,352,353,354,355,356,357,358,359,360,361,362,363,364,365,366,367,368,369,370,371,372,373,374,375,376,377,378,379,380,381,382,383,384,385,386,387,388,389,390,391,392,393,394,395,396,397,398,399,400,401,402,403,404,405,406,407,408,409,410,411,412,413,414,415,416,417,418,419,420,421,422,423,424,425,426,427,428,429,430,431,432,433,434,435,436,437,438,439,440,441,442,443,444,445,446,447,448,449,450]];
module poly_path965(h, w, s, res=line_fn)
{
  scale([custom_scale_x, -custom_scale_y, 1]) union()
  {
    translate (path965_0_center) linear_extrude(height=h, convexity=10, scale=0.01*s)
      translate (-path965_0_center) polygon(path965_0_points, path965_0_paths);
  }
}

module stun(h)
{
  difference()
  {
    union()
    {
      translate ([0,0,0]) poly_path965(h, min_line_mm(0.999998), 100.0);
    }
    union()
    {
    }
  }
}

stun(zsize);
